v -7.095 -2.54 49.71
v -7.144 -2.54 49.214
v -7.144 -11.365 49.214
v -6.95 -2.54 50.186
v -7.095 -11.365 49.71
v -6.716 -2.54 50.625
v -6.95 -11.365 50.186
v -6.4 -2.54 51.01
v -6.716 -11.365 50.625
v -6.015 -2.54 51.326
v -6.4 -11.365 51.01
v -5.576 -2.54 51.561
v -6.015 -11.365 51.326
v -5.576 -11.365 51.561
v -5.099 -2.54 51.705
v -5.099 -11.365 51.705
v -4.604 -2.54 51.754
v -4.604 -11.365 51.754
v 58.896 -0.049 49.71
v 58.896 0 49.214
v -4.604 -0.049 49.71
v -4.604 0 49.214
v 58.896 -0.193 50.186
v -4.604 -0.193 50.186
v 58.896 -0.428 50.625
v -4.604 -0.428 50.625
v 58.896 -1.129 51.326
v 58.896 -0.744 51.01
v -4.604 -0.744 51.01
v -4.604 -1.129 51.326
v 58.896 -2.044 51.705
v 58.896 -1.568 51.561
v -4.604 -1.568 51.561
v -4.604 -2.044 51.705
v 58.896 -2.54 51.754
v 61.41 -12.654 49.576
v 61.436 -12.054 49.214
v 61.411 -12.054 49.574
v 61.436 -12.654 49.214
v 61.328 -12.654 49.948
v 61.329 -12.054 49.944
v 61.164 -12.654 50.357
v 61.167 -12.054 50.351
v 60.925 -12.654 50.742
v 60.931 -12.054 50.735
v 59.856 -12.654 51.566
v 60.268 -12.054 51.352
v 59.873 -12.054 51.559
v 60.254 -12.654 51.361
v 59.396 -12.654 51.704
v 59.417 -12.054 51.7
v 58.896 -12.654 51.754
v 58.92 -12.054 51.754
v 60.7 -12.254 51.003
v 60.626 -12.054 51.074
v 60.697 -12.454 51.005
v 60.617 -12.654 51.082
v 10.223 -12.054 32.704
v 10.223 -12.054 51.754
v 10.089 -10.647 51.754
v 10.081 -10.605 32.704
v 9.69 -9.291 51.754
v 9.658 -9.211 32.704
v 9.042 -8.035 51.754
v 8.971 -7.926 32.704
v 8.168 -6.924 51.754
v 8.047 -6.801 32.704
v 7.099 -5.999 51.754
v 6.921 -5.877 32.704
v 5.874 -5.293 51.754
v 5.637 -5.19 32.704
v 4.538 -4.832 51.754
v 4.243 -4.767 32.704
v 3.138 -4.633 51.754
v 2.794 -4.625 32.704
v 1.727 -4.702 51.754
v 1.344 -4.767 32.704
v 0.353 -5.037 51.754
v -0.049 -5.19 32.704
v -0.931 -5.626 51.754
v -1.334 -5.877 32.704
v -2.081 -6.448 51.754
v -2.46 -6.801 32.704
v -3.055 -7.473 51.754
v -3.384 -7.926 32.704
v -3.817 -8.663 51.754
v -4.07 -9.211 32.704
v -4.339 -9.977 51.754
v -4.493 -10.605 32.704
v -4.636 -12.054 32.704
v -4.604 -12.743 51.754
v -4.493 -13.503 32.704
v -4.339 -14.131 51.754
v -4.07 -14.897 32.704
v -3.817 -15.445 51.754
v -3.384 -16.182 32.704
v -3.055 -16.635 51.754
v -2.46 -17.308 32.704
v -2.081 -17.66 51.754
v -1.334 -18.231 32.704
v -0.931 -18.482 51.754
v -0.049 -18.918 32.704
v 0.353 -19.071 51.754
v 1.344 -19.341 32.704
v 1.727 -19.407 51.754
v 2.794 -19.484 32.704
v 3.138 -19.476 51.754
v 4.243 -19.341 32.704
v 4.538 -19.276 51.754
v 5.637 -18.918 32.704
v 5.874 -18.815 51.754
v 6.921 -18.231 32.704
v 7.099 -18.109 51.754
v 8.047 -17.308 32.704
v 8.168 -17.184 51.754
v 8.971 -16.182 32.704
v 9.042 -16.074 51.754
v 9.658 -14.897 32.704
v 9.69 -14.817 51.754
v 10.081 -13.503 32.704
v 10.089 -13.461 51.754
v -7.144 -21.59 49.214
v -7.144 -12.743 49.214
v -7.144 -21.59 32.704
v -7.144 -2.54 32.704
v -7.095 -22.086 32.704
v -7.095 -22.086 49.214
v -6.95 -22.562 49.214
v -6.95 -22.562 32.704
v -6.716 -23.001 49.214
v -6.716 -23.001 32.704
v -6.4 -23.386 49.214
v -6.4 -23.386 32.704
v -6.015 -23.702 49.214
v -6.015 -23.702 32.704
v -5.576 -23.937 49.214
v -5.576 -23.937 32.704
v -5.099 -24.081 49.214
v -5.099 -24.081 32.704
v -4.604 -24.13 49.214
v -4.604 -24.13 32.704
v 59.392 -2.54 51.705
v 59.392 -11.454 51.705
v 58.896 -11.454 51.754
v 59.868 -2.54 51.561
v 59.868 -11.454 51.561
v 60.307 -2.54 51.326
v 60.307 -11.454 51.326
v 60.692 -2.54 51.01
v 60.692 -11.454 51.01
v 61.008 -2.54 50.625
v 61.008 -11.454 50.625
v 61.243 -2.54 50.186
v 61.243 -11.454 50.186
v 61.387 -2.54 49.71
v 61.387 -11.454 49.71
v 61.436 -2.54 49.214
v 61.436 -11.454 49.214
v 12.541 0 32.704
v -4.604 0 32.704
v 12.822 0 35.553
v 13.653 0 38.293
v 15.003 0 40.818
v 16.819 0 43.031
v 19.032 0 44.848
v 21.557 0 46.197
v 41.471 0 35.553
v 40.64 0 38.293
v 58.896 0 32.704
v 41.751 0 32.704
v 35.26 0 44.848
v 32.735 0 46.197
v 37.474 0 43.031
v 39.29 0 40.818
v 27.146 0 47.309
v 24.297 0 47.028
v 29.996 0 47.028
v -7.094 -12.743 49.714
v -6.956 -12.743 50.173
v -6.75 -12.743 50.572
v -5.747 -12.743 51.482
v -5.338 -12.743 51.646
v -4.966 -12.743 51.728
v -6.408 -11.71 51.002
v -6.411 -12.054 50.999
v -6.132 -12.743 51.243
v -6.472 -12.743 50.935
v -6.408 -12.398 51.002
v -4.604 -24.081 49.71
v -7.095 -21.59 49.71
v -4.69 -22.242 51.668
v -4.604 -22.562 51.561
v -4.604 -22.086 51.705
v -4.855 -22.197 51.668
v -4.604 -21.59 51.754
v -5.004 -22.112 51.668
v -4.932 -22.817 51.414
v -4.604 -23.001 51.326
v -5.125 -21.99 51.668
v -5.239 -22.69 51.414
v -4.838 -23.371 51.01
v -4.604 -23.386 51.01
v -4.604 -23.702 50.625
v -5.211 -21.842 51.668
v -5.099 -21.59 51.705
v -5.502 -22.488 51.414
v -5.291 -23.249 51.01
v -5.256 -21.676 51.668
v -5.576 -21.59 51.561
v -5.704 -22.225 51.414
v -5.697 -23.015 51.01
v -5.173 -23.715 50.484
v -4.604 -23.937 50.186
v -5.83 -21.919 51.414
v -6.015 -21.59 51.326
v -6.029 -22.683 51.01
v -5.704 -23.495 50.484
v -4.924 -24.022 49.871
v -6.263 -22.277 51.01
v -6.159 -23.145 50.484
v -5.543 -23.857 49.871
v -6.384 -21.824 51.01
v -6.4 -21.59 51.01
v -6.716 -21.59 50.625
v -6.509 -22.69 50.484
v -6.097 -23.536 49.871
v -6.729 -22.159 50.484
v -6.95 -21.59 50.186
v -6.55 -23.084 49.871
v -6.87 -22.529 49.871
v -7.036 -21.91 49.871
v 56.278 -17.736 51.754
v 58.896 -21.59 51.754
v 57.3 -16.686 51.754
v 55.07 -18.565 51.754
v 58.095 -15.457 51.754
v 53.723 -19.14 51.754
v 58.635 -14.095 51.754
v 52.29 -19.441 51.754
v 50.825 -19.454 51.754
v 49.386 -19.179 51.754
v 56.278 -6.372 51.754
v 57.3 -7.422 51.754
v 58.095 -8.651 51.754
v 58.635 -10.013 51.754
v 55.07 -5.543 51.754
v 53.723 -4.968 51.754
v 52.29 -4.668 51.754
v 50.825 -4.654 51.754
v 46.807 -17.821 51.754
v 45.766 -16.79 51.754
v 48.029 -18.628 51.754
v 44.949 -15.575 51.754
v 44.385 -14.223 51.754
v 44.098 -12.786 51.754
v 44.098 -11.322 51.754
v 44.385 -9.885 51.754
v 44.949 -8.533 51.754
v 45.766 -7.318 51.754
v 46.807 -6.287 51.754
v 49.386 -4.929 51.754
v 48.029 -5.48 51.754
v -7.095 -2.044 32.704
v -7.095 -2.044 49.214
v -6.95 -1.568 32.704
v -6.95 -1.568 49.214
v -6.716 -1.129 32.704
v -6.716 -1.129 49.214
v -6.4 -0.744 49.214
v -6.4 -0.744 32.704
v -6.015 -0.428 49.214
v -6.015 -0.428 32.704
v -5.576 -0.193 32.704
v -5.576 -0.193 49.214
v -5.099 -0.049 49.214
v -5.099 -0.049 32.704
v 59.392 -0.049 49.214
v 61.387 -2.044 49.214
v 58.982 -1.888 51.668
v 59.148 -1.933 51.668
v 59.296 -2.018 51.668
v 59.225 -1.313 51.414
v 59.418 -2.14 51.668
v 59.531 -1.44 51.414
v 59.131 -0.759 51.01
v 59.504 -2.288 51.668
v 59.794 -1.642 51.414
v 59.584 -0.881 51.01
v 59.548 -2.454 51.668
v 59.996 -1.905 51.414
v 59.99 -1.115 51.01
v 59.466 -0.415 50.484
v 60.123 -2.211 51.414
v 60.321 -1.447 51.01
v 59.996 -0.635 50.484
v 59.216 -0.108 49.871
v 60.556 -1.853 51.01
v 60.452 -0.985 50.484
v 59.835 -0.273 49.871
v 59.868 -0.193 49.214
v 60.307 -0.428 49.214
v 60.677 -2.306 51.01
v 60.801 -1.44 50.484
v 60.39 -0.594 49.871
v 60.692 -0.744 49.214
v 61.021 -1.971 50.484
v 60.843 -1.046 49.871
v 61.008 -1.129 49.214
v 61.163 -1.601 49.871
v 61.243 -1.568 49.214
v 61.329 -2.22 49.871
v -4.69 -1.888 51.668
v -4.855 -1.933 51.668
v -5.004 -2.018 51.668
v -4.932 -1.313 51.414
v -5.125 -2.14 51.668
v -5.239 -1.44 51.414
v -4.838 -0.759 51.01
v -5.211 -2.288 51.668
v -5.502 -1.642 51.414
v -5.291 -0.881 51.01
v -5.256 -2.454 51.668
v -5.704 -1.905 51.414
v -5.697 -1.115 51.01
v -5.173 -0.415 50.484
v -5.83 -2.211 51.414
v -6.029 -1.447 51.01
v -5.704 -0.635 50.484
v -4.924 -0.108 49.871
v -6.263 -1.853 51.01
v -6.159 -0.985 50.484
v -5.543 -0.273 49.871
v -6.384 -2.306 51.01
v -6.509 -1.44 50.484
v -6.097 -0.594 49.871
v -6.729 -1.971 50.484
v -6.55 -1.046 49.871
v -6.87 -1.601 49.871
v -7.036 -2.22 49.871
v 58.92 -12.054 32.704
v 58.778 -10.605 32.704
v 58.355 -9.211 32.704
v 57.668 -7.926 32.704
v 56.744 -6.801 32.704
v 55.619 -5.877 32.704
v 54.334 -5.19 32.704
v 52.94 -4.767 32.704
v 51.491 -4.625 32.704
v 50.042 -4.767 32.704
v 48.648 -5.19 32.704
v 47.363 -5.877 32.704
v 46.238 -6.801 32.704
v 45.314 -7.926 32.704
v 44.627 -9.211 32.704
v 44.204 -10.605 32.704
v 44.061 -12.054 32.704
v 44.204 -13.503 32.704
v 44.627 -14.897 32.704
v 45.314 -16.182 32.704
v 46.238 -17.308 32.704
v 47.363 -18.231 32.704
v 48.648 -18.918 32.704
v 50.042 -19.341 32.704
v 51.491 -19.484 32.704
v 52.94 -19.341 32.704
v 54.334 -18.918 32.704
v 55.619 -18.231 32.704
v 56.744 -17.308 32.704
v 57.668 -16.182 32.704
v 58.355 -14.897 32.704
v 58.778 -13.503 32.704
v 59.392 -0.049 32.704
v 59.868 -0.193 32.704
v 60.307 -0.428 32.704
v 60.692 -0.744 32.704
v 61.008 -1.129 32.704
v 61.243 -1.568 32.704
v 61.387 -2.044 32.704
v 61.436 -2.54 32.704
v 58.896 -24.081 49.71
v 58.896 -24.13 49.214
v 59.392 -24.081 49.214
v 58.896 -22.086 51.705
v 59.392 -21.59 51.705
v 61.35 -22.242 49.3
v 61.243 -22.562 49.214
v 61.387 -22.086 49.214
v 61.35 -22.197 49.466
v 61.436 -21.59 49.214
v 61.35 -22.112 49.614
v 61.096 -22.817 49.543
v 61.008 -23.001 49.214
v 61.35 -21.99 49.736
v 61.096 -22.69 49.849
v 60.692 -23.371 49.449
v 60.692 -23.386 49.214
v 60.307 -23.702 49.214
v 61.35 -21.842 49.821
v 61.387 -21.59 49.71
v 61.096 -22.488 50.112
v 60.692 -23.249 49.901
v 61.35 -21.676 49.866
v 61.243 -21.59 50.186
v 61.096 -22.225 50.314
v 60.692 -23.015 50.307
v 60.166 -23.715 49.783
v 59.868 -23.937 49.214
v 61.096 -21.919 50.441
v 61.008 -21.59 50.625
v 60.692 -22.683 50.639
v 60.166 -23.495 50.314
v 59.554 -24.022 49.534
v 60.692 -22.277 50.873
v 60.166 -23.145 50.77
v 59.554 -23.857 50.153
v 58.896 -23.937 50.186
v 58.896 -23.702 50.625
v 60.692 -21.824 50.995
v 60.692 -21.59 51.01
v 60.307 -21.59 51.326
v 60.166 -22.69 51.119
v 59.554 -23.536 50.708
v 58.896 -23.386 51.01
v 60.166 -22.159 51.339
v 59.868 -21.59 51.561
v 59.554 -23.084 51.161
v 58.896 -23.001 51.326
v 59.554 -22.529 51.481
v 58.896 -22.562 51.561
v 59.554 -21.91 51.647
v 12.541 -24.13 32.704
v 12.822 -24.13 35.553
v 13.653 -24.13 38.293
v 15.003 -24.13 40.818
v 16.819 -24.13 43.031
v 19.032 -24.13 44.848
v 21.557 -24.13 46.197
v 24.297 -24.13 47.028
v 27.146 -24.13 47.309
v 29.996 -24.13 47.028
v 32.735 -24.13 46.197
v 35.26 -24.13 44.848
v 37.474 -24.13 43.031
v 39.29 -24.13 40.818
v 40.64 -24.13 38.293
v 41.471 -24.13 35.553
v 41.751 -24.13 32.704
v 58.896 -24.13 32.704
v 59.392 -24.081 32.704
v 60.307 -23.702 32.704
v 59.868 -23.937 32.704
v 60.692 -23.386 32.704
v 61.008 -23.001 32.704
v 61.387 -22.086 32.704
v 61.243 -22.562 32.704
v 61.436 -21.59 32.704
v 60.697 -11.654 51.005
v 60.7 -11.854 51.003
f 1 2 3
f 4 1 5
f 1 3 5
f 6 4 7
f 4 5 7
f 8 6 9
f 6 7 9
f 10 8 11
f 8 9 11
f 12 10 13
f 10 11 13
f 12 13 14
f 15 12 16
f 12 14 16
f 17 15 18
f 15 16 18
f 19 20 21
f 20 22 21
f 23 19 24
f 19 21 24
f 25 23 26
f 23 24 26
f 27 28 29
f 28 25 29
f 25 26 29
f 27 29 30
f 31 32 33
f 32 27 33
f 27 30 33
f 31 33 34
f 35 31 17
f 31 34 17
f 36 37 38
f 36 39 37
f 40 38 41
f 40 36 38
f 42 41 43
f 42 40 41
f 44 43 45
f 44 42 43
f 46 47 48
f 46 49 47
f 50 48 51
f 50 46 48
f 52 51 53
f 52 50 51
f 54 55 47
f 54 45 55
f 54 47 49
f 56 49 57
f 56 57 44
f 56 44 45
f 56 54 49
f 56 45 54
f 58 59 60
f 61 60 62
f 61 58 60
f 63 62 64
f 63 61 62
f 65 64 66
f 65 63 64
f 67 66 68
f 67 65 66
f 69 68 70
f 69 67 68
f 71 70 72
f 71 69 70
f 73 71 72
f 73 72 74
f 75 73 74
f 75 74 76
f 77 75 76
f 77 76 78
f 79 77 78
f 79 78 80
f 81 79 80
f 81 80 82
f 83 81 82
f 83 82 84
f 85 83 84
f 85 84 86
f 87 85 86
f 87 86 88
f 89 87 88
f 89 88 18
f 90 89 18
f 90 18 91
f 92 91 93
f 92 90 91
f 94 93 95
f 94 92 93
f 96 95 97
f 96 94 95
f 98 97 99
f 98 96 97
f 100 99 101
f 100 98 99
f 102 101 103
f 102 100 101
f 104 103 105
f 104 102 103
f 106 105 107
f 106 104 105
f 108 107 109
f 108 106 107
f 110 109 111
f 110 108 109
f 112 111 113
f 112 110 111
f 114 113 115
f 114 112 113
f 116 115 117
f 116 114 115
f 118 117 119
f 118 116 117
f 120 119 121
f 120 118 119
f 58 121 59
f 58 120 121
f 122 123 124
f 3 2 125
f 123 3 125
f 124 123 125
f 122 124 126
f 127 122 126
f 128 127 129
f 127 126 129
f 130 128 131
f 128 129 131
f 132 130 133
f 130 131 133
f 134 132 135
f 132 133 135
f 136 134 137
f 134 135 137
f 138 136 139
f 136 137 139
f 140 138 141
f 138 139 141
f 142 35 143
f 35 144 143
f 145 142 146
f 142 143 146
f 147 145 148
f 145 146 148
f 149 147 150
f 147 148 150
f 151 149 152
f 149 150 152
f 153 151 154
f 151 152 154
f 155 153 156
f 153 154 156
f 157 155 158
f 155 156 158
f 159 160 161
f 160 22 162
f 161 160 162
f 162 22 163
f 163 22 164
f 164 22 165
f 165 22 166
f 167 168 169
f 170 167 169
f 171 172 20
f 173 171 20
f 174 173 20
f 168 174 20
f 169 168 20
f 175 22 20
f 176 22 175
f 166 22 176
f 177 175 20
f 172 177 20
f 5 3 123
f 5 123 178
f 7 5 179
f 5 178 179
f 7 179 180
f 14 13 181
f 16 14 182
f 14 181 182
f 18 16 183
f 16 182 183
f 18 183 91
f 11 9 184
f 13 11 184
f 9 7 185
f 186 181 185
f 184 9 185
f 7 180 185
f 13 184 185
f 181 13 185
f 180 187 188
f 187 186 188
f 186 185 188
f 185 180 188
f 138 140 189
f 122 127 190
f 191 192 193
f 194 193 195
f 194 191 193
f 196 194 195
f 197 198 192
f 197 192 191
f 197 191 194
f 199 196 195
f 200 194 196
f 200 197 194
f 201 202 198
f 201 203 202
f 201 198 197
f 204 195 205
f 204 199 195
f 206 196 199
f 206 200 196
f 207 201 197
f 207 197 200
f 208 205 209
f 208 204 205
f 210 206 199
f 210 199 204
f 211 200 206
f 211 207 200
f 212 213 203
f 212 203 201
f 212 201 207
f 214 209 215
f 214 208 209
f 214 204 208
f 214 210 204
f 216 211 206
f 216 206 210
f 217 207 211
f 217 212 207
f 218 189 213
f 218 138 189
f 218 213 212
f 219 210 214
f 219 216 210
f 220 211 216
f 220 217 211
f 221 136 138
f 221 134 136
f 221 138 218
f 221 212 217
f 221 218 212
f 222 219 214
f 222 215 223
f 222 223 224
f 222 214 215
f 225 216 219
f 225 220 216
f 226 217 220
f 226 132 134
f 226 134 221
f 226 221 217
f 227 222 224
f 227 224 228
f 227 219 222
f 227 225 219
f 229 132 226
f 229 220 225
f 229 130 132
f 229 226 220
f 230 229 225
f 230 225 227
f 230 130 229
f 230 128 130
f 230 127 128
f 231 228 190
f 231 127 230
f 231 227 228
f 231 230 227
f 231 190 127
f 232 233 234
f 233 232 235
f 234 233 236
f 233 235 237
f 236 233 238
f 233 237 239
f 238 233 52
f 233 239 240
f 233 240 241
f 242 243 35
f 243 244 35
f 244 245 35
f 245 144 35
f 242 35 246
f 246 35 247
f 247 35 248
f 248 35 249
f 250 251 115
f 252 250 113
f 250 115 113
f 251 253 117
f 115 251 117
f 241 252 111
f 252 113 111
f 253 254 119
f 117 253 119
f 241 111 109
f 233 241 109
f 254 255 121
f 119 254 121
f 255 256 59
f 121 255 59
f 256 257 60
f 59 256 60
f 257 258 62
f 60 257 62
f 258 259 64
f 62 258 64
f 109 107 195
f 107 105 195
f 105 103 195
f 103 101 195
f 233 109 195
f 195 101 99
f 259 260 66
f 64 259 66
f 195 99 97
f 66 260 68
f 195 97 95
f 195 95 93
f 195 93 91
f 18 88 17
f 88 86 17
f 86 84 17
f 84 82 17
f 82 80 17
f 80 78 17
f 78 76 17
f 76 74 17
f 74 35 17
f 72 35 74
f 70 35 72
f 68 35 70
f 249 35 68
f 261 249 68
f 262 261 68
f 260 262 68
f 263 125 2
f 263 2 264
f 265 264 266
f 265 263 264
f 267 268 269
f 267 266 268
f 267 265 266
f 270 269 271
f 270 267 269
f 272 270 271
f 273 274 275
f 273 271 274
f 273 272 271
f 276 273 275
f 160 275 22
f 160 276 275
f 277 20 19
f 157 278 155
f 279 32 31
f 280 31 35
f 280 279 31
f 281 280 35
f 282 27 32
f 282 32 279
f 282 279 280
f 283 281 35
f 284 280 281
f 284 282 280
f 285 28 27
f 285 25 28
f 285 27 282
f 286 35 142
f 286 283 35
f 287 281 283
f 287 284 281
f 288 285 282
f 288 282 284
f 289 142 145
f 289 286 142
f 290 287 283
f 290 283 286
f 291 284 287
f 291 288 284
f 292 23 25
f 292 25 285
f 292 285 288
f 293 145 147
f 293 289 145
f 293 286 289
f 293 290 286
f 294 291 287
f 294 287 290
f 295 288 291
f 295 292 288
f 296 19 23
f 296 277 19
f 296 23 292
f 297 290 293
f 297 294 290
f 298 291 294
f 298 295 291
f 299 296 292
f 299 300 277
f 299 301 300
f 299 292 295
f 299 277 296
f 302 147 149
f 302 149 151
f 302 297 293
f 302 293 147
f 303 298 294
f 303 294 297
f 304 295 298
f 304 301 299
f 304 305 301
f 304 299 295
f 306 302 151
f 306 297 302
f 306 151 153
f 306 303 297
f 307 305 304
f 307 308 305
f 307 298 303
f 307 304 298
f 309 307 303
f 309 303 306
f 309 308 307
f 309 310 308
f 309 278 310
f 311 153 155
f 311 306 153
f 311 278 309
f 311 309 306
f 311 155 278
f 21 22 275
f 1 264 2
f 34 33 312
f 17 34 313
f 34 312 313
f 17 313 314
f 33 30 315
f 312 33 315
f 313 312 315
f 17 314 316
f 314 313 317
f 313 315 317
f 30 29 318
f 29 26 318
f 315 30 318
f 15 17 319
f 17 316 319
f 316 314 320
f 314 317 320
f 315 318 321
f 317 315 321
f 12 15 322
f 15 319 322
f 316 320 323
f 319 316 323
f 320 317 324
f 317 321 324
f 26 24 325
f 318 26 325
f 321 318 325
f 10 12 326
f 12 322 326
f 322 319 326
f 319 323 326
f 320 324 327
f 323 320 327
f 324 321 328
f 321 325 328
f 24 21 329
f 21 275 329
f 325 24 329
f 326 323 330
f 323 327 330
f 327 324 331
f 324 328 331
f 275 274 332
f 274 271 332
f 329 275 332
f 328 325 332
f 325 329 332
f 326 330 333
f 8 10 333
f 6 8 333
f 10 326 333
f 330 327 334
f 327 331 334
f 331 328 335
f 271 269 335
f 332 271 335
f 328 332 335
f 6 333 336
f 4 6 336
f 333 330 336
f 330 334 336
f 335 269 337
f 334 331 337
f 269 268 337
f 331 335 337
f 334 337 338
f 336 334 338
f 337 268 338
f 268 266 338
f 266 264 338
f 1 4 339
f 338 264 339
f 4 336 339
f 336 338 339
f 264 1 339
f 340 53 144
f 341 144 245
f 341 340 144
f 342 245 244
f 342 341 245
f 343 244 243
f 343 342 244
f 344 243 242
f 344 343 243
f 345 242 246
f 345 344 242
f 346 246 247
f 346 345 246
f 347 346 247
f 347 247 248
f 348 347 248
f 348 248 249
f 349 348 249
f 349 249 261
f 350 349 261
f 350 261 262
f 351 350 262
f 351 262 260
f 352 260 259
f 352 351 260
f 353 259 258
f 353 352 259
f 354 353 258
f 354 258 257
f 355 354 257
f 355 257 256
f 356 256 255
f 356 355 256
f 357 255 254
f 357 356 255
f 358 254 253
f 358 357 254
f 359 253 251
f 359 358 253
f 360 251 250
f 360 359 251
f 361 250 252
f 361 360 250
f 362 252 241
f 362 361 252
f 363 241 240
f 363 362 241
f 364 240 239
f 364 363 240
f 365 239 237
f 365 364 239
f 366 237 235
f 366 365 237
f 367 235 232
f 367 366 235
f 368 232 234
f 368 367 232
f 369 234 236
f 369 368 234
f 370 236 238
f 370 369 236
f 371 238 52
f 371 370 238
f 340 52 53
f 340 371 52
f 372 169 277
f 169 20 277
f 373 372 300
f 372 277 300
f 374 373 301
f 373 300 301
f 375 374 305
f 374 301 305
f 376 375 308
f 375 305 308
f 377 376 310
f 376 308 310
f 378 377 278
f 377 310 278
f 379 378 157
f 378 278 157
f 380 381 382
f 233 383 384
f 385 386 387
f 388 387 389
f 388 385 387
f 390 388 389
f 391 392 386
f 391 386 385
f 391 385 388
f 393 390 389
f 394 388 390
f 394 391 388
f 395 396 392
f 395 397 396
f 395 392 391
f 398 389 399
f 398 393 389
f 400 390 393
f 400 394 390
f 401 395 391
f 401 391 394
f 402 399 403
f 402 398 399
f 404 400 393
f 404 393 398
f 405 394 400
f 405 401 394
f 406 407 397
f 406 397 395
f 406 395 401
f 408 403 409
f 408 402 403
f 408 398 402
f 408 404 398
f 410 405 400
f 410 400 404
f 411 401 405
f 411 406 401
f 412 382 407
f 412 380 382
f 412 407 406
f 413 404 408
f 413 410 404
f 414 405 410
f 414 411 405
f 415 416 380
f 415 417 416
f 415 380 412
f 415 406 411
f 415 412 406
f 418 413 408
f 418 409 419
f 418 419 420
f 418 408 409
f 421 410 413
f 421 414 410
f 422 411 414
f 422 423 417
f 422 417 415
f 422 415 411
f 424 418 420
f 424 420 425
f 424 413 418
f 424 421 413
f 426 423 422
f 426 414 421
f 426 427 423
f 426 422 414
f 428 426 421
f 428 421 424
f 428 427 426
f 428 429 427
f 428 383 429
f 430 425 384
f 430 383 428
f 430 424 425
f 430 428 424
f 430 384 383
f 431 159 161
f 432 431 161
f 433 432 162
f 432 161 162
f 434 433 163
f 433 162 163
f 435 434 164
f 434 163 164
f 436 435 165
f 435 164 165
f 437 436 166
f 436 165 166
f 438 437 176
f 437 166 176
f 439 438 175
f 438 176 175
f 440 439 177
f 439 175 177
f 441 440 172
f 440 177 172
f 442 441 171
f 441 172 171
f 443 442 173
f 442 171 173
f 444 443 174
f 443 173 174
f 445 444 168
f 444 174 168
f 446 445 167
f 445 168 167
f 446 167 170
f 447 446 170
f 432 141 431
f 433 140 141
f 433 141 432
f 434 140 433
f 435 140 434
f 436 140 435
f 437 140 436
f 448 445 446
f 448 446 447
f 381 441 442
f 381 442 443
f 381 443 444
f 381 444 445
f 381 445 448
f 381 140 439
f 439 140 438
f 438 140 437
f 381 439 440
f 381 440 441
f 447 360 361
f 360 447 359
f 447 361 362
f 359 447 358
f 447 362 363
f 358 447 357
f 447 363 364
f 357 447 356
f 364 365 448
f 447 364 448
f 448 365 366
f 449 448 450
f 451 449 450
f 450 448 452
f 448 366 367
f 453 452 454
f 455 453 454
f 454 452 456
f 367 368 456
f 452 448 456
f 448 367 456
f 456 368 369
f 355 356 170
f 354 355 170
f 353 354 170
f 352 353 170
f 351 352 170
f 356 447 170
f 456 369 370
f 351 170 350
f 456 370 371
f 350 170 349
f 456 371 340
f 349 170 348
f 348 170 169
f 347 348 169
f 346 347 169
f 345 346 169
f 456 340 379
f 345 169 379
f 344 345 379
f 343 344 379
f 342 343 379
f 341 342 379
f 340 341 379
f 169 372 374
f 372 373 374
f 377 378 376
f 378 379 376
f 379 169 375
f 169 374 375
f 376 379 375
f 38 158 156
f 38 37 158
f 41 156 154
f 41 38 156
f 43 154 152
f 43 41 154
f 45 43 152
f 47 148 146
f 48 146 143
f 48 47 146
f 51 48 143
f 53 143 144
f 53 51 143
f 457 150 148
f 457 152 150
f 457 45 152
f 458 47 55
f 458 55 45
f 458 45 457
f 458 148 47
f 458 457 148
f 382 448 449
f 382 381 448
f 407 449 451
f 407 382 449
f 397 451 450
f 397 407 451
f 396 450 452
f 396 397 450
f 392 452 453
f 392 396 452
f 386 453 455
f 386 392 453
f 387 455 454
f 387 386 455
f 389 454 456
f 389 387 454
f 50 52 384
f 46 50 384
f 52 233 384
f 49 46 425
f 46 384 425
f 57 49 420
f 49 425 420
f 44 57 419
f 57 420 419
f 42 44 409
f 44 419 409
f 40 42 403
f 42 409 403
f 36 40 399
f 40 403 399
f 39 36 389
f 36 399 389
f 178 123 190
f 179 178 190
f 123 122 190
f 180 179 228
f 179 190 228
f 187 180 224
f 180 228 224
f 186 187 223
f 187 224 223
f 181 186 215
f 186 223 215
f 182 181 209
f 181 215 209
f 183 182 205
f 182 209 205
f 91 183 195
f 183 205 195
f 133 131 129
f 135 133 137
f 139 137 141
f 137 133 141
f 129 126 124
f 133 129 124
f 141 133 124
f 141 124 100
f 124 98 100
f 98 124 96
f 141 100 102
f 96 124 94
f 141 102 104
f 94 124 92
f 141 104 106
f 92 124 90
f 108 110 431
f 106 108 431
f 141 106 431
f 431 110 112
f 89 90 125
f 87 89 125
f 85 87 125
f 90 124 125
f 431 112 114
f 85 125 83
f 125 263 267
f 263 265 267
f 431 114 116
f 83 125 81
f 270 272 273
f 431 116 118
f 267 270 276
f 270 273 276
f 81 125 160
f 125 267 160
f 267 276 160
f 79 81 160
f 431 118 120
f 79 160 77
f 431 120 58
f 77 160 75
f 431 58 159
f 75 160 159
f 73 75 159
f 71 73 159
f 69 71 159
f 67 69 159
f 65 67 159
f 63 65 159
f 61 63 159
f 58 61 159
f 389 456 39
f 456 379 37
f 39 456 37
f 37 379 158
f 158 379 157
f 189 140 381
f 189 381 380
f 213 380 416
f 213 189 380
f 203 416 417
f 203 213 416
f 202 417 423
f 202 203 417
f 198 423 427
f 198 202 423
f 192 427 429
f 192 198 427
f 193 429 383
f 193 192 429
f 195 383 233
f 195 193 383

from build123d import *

# Parameters (mm, degrees)
F1_DEPTH = 24.13
F2_R     = 7.4295
F3_DEPTH = 54.61
F4_R     = 2.54


with BuildPart() as f1:
    # F0 (on Front) → F1 (new body)
    with BuildSketch(Plane.XZ):
        with BuildLine():
            Line((-7.143751, 47.944095), (-7.143751, 32.704095))
            Line((-7.143751, 32.704095), (12.541249, 32.704095))
            ThreePointArc((12.541249, 32.704095), (27.146249, 47.309095), (41.751249, 32.704095))
            Line((41.751249, 32.704095), (61.436249, 32.704095))
            Line((61.436249, 32.704095), (61.436249, 51.754095))
            Line((61.436249, 51.754095), (-3.333751, 51.754095))
            Line((-3.333751, 51.754095), (-7.143751, 51.754095))
            Line((-7.143751, 51.754095), (-7.143751, 47.944095))
        make_face()
    extrude(amount=F1_DEPTH)

    # F2 (on Top) → F3 (cut)
    with BuildSketch(Plane.XY):
        with Locations((51.49099, -12.054064)):
            Circle(F2_R)
        with Locations((2.793759, -12.054064)):
            Circle(F2_R)
    extrude(amount=F3_DEPTH, mode=Mode.SUBTRACT)

    # F4
    f4_edges = [f1.edges().sort_by_distance(p)[0] for p in [
        (61.436249, 0, 42.229095),
        (-7.143751, 0, 42.229095),
        (-7.143751, -24.13, 42.229095),
        (27.146249, -24.13, 51.754095),
        (27.146249, 0, 51.754095),
        (61.436249, -24.13, 42.229095),
        (-7.143751, -12.065, 51.754095),
        (61.436249, -12.065, 51.754095),
    ]]
    fillet(f4_edges, radius=F4_R)


solid = f1.part
